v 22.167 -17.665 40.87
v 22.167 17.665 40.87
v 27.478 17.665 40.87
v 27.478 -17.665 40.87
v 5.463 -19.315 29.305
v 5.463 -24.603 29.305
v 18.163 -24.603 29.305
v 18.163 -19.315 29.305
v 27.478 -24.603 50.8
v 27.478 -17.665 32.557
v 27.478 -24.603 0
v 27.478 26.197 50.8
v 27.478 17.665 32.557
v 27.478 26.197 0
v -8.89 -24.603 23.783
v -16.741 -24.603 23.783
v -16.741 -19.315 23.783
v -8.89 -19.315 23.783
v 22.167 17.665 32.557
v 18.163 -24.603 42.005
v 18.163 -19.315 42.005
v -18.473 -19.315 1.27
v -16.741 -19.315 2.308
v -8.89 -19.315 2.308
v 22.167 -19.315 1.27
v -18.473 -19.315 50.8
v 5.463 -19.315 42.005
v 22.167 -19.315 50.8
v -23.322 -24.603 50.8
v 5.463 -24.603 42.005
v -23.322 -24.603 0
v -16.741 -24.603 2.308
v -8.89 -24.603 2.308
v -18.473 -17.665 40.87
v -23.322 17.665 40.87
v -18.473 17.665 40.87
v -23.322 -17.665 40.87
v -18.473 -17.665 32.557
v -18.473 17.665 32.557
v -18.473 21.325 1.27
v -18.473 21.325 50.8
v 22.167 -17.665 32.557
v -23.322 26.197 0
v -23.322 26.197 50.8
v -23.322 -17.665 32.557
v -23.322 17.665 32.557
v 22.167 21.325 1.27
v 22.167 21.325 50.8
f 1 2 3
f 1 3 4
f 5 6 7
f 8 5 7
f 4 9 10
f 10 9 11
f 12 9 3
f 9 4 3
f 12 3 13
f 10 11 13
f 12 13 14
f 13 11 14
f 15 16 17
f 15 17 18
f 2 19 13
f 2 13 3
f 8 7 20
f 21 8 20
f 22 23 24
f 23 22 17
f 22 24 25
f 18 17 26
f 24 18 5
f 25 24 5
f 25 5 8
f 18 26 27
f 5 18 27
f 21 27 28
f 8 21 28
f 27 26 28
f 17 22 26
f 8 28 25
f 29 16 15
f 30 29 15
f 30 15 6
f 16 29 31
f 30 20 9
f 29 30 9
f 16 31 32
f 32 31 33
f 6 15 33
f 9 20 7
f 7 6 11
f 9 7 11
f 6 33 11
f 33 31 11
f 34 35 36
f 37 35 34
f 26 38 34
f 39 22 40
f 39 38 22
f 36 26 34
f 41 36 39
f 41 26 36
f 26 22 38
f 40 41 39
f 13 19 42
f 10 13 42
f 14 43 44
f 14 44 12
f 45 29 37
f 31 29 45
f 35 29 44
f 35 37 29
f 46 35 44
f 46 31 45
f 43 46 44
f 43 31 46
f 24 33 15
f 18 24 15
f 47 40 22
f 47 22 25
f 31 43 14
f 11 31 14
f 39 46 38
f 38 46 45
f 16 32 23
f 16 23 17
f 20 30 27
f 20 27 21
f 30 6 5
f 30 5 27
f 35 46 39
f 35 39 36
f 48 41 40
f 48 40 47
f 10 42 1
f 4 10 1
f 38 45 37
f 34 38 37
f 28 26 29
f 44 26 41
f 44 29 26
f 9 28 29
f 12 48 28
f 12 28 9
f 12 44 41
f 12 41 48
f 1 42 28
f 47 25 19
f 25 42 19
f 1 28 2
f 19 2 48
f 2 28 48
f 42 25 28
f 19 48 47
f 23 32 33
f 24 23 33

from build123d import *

# Parameters (mm, degrees)
F0_W     = 50.8
F0_H     = 50.8
F1_DEPTH = 50.8
F2_W     = 40.64
F2_H     = 40.64
F3_DEPTH = 49.53
F4_W     = 7.850907743
F4_H     = 21.4745448902
F5_DEPTH = 25.4
F6_W     = 12.7
F6_H     = 12.7
F7_DEPTH = 7.62
F8_W     = 35.329092294
F8_H     = 8.312728256
F9_DEPTH = 50.8


with BuildPart() as f1:
    # F0 (on Top) → F1 (new body)
    with BuildSketch(Plane.XY):
        with Locations((2.078182064, 0.7973827244)):
            Rectangle(F0_W, F0_H)
    extrude(amount=F1_DEPTH)

    # F2 (on face) → F3 (cut)
    with BuildSketch(Plane.XY.offset(50.8)):
        with Locations((1.8472736701, 1.0047121724)):
            Rectangle(F2_W, F2_H)
    extrude(amount=-F3_DEPTH, mode=Mode.SUBTRACT)

    # F4 (on face) → F5 (cut)
    with BuildSketch(Plane.XZ.offset(24.6026172756)):
        with Locations((-12.8154549748, 13.0454613827)):
            Rectangle(F4_W, F4_H)
    extrude(amount=-F5_DEPTH, mode=Mode.SUBTRACT)

    # F6 (on face) → F7 (cut)
    with BuildSketch(Plane.XZ.offset(24.6026172756)):
        with Locations((11.8126636371, 35.6554915783)):
            Rectangle(F6_W, F6_H)
    extrude(amount=-F7_DEPTH, mode=Mode.SUBTRACT)

    # F8 (on face) → F9 (cut)
    with BuildSketch(Plane(origin=(-23.321817936, 0, 0), x_dir=(0, -1, 0), z_dir=(-1, 0, 0))):
        with Locations((0, 36.7136429995)):
            Rectangle(F8_W, F8_H)
    extrude(amount=-F9_DEPTH, mode=Mode.SUBTRACT)


solid = f1.part
